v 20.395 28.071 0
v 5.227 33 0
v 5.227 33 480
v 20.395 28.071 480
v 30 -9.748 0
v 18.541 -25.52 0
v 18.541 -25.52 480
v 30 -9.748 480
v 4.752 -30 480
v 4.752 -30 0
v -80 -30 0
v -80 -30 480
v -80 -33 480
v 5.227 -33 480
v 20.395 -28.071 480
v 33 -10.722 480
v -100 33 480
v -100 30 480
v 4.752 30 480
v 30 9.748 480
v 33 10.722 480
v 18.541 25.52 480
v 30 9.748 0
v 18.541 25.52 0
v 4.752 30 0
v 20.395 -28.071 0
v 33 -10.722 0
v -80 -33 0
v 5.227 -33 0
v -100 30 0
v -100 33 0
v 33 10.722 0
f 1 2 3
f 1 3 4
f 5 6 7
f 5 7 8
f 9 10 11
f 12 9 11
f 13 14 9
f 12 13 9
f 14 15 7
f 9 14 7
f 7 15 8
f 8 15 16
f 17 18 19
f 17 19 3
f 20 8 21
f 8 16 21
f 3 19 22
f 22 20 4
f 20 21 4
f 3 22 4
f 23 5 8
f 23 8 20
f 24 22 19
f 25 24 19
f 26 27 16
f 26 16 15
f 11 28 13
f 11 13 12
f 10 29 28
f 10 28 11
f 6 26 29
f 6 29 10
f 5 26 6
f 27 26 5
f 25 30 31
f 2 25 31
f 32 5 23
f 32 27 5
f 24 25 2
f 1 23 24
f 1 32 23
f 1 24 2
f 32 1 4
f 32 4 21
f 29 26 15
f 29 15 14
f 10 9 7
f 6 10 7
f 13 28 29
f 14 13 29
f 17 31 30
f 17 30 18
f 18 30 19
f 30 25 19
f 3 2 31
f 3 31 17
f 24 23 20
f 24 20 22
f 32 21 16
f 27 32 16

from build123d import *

# Parameters (mm, degrees)
BOSS_EXTRU_1_DEPTH = 480
ESQUISSE3_W        = 480
ESQUISSE3_H        = 3
BOSS_EXTRU_2_DEPTH = 20


with BuildPart() as part:
    # Esquisse1 → Boss.-Extru.1 (new body)
    with BuildSketch(Plane.XY):
        Polygon((0, 30), (-80, 30), (-80, 33), (0, 33), (5.226686531, 33), (20.395121629, 28.071476676), (33, 10.722349976), (33, -10.722349976), (20.395121629, -28.071476676), (5.226686531, -33), (0, -33), (-80, -33), (-80, -30), (0, -30), (4.75153321, -30), (18.541019662, -25.519524251), (30, -9.747590887), (30, 9.747590887), (18.541019662, 25.519524251), (4.75153321, 30), align=None)
    extrude(amount=BOSS_EXTRU_1_DEPTH)

    # Esquisse3 → Boss.-Extru.2 (add)
    with BuildSketch(Plane.ZY.offset(80)):
        with Locations((240, 31.5)):
            Rectangle(ESQUISSE3_W, ESQUISSE3_H)
    extrude(amount=BOSS_EXTRU_2_DEPTH)


solid = part.part
